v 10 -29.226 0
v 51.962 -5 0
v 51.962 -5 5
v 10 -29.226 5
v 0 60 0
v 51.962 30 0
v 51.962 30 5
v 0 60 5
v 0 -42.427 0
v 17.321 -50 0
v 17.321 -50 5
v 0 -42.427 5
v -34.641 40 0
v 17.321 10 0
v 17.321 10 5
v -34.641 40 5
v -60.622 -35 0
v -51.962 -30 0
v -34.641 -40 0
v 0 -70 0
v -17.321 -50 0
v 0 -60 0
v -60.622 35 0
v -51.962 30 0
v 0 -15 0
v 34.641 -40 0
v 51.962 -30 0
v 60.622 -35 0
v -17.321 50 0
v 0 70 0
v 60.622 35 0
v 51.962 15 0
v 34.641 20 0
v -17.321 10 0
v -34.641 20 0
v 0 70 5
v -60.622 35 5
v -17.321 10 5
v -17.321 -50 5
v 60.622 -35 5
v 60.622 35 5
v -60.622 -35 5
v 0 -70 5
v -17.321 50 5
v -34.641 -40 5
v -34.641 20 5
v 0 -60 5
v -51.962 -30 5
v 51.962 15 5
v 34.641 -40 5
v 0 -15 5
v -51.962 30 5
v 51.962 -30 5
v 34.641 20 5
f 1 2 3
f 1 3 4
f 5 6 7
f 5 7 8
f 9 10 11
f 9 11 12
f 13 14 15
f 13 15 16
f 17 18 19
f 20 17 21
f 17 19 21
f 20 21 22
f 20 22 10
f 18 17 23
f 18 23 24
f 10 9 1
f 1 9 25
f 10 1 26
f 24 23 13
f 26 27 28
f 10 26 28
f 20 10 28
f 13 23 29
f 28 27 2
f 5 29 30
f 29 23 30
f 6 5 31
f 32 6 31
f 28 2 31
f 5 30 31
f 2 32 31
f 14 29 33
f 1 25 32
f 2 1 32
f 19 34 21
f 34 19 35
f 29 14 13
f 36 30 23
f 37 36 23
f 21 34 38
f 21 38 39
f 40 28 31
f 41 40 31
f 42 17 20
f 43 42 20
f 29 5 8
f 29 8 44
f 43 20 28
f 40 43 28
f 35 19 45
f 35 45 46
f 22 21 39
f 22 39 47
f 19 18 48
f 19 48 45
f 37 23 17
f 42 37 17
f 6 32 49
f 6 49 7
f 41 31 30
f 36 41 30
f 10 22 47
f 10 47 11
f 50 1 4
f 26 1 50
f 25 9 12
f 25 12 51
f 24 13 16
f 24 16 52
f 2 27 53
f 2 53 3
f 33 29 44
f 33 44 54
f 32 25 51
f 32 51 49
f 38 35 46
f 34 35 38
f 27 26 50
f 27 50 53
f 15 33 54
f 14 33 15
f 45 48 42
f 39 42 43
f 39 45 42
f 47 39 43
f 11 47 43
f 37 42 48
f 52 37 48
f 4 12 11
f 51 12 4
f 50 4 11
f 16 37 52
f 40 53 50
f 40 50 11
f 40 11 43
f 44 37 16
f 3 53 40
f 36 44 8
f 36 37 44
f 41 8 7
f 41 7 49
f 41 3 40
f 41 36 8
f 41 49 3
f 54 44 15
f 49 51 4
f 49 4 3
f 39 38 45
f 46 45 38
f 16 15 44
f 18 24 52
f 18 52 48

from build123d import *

# Parameters (mm, degrees)
PAD_DEPTH = 5


with BuildPart() as part:
    # Sketch → Pad (new body)
    with BuildSketch(Plane.XY):
        Polygon((60.621778, 35), (0, 70), (-60.621778, 35), (-60.621778, -35), (0, -70), (60.621778, -35), align=None)
        Polygon((-17.320508, 50), (34.641016, 20), (17.320508, 10), (-34.641016, 40), (-51.961524, 30), (-51.961524, -30), (-34.641016, -40), (-34.641016, 20), (-17.320508, 10), (-17.320508, -50), (0, -60), (17.320508, -50), (0, -42.427157), (0, -15), (51.961524, 15), (51.961524, 30), (0, 60), align=None, mode=Mode.SUBTRACT)
        Polygon((51.961524, -5), (10, -29.226497), (34.641016, -40), (51.961524, -30), align=None, mode=Mode.SUBTRACT)
    extrude(amount=PAD_DEPTH)


solid = part.part
